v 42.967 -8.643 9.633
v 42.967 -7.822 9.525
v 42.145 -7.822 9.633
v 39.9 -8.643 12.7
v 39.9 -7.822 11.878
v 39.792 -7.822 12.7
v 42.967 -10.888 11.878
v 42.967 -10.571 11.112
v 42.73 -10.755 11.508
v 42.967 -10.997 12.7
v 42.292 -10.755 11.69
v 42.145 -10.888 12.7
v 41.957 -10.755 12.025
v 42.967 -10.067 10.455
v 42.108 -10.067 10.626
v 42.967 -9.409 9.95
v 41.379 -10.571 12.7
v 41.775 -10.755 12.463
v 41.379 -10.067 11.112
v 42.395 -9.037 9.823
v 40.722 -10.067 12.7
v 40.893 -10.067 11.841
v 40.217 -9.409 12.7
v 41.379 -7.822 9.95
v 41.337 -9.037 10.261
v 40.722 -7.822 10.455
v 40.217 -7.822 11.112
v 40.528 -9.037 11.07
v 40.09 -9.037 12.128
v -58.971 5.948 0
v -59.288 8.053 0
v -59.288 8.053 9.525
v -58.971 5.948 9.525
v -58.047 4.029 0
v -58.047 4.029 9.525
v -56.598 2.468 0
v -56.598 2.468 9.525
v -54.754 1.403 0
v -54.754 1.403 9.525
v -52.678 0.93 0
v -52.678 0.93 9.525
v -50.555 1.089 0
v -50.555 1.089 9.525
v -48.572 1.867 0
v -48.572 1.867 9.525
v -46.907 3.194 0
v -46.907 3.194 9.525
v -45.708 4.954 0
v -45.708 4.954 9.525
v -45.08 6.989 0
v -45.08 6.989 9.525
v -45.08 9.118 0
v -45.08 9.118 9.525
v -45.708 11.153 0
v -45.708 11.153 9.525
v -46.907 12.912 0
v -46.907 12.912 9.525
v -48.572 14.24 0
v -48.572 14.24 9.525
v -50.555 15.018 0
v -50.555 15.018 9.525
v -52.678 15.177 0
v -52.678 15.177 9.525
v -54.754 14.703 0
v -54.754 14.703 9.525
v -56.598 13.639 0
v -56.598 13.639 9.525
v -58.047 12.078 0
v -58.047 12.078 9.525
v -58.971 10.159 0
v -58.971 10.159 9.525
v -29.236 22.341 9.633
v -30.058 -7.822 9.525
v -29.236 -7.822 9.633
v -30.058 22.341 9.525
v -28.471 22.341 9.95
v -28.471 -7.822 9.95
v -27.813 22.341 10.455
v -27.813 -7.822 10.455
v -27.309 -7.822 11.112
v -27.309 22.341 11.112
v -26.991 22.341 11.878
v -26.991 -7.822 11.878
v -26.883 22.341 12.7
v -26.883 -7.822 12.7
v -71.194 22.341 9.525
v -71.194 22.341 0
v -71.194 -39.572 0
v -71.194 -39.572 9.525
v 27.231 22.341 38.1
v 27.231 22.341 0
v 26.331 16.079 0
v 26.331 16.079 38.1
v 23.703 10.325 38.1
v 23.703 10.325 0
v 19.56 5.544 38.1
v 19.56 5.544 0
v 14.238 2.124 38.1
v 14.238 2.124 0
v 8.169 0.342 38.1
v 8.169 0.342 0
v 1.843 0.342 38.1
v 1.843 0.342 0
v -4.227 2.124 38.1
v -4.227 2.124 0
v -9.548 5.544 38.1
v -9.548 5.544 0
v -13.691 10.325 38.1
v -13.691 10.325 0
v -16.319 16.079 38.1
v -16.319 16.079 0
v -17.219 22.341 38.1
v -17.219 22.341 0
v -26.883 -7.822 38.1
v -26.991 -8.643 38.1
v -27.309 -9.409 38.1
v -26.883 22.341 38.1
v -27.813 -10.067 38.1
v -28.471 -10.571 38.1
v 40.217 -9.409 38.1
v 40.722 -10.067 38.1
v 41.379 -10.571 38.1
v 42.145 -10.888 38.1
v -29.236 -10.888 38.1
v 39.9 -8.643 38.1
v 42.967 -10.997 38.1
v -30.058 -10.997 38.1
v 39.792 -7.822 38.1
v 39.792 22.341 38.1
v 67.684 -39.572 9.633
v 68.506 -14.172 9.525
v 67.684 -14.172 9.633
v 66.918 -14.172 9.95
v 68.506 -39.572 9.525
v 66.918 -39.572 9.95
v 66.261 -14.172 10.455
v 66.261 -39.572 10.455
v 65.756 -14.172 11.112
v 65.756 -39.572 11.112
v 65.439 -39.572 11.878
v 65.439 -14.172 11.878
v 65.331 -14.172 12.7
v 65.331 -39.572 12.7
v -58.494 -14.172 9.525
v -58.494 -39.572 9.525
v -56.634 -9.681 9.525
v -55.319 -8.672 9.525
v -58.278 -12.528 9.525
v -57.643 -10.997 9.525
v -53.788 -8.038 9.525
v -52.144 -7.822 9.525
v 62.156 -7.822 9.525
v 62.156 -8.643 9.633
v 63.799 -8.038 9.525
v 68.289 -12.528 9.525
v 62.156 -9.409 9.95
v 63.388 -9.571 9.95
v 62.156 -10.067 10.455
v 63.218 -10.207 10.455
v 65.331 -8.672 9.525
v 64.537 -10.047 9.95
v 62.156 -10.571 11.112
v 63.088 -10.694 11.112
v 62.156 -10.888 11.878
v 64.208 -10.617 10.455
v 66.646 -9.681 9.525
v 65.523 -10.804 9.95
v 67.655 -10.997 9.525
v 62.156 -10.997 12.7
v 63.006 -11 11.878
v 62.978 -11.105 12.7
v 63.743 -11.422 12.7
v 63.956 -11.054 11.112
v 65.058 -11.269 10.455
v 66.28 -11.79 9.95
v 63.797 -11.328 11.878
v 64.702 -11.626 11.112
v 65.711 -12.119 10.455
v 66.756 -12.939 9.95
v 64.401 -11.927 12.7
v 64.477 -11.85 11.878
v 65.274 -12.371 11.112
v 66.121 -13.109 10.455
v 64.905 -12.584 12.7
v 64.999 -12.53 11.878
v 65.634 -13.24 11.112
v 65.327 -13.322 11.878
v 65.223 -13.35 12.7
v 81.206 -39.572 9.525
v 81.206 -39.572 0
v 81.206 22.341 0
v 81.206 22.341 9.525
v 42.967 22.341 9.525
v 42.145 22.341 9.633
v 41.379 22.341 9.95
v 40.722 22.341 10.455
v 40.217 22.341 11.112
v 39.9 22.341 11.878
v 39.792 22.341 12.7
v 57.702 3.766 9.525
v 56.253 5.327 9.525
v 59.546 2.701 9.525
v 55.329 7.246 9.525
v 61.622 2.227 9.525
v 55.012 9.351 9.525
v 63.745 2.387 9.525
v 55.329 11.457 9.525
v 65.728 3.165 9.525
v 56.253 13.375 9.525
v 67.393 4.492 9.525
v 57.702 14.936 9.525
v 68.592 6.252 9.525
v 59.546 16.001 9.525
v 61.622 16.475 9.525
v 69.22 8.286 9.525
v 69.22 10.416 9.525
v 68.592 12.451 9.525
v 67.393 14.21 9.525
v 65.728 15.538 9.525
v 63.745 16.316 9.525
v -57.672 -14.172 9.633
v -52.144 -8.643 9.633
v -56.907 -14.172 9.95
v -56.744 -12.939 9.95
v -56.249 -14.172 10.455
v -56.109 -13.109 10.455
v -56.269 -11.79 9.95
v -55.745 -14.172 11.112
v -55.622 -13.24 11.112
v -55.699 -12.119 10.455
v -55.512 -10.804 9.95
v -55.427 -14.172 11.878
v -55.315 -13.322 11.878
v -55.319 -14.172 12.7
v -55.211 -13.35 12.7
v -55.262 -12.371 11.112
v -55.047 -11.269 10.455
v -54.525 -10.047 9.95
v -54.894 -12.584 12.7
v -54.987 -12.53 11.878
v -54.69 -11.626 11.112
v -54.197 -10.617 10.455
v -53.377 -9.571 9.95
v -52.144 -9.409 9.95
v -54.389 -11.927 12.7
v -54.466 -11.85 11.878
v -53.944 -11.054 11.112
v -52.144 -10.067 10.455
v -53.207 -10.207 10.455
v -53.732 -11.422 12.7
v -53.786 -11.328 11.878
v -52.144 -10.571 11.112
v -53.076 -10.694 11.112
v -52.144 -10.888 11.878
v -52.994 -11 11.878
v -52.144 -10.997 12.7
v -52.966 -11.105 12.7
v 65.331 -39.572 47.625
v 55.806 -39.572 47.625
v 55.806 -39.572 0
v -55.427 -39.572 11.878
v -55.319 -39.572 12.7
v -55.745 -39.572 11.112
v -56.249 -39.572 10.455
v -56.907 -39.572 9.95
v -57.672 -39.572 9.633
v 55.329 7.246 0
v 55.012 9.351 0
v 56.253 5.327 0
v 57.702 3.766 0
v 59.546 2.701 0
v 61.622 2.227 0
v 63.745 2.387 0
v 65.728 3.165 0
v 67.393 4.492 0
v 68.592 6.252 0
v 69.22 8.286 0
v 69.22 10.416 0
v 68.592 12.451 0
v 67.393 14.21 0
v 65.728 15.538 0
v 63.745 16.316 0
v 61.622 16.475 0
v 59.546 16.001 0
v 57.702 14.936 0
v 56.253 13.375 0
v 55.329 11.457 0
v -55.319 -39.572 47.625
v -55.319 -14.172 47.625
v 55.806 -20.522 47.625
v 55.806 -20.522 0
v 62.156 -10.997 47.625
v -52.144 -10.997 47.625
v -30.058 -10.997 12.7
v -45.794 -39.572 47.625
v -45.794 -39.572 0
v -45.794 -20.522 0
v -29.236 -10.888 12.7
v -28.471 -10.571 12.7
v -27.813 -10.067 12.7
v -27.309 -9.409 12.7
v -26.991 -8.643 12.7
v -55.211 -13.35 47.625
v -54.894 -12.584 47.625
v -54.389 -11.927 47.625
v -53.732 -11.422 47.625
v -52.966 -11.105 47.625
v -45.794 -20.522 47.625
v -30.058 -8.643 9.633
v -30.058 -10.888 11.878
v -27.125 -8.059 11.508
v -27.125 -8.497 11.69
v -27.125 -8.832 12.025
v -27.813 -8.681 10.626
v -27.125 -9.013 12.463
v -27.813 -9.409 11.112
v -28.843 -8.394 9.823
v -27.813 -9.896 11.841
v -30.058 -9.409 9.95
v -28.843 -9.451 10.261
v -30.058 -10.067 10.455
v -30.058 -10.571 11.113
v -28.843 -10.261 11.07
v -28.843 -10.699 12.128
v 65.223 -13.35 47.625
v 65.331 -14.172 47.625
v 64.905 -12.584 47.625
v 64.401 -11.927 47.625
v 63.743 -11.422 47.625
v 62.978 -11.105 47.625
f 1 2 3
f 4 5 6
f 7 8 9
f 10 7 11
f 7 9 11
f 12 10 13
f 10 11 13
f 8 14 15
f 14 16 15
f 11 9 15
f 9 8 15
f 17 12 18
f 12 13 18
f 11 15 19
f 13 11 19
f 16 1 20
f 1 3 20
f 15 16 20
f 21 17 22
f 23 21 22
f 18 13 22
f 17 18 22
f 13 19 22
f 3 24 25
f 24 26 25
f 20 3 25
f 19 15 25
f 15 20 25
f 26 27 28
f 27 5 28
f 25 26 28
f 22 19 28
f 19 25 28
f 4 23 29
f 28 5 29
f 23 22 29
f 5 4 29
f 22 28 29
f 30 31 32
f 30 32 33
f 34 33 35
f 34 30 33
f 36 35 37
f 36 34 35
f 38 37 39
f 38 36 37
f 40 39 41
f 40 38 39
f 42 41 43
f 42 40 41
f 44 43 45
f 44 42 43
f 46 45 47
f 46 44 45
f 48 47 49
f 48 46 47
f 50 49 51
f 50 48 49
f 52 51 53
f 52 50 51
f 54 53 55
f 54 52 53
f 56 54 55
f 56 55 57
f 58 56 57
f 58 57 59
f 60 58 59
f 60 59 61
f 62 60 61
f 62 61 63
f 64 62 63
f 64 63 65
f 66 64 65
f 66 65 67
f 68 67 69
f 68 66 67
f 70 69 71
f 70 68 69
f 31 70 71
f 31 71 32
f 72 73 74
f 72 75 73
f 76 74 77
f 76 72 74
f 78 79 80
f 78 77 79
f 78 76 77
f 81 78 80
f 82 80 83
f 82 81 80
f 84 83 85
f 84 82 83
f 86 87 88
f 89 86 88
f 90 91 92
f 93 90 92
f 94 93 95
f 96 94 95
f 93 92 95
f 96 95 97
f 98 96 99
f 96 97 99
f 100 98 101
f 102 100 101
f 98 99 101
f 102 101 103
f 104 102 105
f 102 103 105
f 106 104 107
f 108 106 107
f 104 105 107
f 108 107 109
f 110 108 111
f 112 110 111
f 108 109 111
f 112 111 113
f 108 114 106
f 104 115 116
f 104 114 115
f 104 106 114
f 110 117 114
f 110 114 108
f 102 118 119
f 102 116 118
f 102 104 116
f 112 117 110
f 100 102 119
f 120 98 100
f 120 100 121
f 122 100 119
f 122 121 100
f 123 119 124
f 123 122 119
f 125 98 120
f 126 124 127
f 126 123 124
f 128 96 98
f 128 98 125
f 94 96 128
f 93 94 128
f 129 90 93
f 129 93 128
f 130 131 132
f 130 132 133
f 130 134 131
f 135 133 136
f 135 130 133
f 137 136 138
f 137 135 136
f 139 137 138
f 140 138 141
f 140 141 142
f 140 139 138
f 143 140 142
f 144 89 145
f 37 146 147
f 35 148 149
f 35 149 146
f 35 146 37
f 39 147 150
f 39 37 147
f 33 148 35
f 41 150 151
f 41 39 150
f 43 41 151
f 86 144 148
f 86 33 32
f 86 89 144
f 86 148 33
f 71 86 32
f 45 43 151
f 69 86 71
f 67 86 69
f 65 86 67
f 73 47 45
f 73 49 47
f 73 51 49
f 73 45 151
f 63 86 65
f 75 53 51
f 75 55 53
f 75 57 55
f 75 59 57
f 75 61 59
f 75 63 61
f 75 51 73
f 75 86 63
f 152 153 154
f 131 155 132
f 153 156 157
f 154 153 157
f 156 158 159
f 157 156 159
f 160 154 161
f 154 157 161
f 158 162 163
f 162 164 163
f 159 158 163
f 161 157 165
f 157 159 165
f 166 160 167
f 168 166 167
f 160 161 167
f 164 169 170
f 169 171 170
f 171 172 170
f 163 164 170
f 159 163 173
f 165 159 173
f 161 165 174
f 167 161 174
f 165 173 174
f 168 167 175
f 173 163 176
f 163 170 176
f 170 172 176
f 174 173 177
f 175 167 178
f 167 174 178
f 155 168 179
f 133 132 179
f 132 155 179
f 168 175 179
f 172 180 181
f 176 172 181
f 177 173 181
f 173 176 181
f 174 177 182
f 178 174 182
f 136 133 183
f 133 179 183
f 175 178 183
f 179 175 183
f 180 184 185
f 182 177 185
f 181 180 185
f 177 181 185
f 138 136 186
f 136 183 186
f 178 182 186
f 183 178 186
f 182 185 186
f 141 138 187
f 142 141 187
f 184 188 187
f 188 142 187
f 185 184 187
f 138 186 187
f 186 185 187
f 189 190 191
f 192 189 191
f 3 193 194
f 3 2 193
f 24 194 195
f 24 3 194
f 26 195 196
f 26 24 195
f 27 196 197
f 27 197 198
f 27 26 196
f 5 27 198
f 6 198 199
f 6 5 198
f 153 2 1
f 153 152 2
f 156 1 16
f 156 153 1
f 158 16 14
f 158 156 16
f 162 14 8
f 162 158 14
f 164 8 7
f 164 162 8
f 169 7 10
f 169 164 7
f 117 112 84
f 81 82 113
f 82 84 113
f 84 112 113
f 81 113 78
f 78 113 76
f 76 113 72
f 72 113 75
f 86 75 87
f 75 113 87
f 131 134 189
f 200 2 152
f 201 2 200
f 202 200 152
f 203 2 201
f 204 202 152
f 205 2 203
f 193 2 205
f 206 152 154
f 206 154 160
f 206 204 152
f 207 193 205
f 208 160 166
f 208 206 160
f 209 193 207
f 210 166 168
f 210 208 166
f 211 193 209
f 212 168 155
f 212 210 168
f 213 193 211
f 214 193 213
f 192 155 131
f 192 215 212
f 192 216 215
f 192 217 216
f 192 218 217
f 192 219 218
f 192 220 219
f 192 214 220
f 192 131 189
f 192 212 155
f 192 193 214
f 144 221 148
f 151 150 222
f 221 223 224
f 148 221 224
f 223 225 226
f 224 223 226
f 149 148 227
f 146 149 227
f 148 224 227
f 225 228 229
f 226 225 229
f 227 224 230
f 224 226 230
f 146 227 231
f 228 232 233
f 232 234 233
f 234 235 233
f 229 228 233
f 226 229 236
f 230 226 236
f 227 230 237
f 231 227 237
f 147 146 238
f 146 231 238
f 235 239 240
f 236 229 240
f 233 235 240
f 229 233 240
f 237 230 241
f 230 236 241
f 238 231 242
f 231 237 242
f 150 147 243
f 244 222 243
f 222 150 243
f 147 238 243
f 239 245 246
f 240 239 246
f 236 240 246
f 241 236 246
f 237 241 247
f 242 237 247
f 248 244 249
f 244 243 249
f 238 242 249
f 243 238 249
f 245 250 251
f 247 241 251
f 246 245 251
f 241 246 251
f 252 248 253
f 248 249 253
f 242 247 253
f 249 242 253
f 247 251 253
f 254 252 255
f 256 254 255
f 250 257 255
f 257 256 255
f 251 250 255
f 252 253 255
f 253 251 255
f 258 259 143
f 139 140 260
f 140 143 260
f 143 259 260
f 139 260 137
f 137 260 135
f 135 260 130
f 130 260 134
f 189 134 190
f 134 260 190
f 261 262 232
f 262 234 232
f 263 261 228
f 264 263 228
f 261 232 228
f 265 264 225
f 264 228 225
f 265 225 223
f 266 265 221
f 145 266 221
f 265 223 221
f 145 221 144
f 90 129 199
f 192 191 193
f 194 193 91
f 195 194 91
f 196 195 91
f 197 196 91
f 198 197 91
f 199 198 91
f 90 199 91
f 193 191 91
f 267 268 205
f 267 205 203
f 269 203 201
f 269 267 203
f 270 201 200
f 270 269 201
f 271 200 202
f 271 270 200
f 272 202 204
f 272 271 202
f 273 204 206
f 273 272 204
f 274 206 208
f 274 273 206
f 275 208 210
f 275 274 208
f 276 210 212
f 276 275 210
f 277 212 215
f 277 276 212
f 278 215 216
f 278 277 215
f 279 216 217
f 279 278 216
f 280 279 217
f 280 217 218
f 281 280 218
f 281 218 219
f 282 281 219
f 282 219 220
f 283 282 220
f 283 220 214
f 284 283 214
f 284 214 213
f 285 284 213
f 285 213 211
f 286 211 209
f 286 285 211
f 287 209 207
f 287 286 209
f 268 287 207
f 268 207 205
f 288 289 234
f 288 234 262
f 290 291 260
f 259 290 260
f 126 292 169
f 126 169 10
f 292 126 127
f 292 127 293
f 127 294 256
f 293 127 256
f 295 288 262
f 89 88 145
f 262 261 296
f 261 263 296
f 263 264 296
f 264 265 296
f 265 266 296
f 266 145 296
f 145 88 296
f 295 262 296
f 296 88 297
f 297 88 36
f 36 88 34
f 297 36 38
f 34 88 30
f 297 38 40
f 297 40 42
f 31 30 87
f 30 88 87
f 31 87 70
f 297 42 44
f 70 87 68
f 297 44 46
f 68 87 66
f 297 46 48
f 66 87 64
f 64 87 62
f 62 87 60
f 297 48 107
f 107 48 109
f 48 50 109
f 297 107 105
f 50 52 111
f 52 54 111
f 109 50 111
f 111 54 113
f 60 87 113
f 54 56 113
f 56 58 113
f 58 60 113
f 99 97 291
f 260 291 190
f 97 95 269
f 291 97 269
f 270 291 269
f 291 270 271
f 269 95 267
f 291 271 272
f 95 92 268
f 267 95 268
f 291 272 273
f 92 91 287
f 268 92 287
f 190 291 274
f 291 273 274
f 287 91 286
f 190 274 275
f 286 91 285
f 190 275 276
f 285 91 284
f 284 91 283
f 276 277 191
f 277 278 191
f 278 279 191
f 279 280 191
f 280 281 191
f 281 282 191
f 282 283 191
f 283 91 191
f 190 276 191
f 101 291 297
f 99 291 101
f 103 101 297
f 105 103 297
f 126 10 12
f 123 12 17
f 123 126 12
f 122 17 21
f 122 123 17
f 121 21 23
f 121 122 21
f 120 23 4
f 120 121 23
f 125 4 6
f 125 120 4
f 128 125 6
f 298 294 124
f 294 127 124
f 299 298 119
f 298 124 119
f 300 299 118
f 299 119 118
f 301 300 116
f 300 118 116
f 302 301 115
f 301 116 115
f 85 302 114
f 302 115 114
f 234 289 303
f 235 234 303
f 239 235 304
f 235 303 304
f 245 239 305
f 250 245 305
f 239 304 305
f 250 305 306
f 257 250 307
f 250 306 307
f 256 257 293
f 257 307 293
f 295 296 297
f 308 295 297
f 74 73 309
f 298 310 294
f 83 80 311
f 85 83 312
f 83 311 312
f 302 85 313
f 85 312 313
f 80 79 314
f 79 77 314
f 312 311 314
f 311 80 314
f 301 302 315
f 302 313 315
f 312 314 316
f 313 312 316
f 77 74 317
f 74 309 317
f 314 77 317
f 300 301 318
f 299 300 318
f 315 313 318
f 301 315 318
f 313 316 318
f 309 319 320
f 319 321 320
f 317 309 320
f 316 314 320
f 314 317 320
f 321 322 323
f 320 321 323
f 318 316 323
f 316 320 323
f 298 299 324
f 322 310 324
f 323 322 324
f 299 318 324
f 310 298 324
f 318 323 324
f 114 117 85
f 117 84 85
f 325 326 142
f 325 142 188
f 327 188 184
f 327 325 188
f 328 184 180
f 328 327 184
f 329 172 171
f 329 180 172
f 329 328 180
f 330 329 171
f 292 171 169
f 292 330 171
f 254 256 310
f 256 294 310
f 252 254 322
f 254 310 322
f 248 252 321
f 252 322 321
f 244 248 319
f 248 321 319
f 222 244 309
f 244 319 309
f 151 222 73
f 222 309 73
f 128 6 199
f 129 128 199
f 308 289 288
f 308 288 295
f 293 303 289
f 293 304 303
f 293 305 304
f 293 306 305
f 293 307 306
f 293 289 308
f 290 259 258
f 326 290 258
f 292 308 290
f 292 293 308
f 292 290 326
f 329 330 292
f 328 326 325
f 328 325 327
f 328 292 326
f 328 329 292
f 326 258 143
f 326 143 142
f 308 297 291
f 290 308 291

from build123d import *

# Parameters (mm, degrees)
SKETCH1_R             = 7.14375
BOSS_EXTRUDE1_DEPTH   = 9.525
BOSS_EXTRUDE1_2_DEPTH = 9.525
BOSS_EXTRUDE2_DEPTH   = 47.625
BOSS_EXTRUDE3_DEPTH   = 38.1
FILLET1_R             = 3.175


with BuildPart() as part:
    # Sketch1 → Boss-Extrude1 (new body)
    with BuildSketch(Plane.XY):
        Polygon((-26.883211679, -10.996624088), (-26.883211679, 22.340875912), (-71.194160584, 22.340875912), (-71.194160584, -39.571624088), (-55.319160584, -39.571624088), (-55.319160584, -10.996624088), align=None)
        with Locations((-52.144160584, 8.053375912)):
            Circle(SKETCH1_R, mode=Mode.SUBTRACT)
    extrude(amount=BOSS_EXTRUDE1_DEPTH)



with BuildPart() as body_2:
    # Sketch1 → Boss-Extrude1 2 (new body)
    with BuildSketch(Plane.XY):
        Polygon((39.791788321, 22.340875912), (39.791788321, -10.996624088), (65.330839416, -10.996624088), (65.330839416, -39.571624088), (81.205839416, -39.571624088), (81.205839416, 22.340875912), align=None)
        with Locations((62.155839416, 9.351186131)):
            Circle(SKETCH1_R, mode=Mode.SUBTRACT)
    extrude(amount=BOSS_EXTRUDE1_2_DEPTH)


with BuildPart() as part_1:
    add(part.part)

    add(body_2.part)  # Boss-Extrude2 merges body 2
    # Sketch1<4> → Boss-Extrude2 (add)
    with BuildSketch(Plane.XY):
        Polygon((39.791788321, -10.996624088), (-26.883211679, -10.996624088), (-55.319160584, -10.996624088), (-55.319160584, -39.571624088), (-45.794160584, -39.571624088), (-45.794160584, -37.984124088), (-45.794160584, -20.521624088), (55.805839416, -20.521624088), (55.805839416, -37.984124088), (55.805839416, -39.571624088), (65.330839416, -39.571624088), (65.330839416, -10.996624088), align=None)
    extrude(amount=BOSS_EXTRUDE2_DEPTH)

    # Sketch1<5> → Boss-Extrude3 (add)
    with BuildSketch(Plane.XY):
        with BuildLine():
            Line((-17.219160584, 22.340875912), (-26.883211679, 22.340875912))
            Line((-26.883211679, 22.340875912), (-26.883211679, -10.996624088))
            Line((-26.883211679, -10.996624088), (39.791788321, -10.996624088))
            Line((39.791788321, -10.996624088), (39.791788321, 22.340875912))
            Line((39.791788321, 22.340875912), (27.230839416, 22.340875912))
            ThreePointArc((27.230839416, 22.340875912), (5.005839416, 0.115875912), (-17.219160584, 22.340875912))
        make_face()
    extrude(amount=BOSS_EXTRUDE3_DEPTH)

    # Fillet1
    fillet1_edges = [part_1.edges().sort_by_distance(p)[0] for p in [
        (-55.319160584, -10.996624088, 28.575),
        (-26.883211679, 5.672125912, 9.525),
        (-26.883211679, -10.996624088, 23.8125),
        (-55.319160584, -25.284124088, 9.525),
        (-41.101186131, -10.996624088, 9.525),
        (65.330839416, -25.284124088, 9.525),
        (52.561313869, -10.996624088, 9.525),
        (39.791788321, 5.672125912, 9.525),
        (39.791788321, -10.996624088, 23.8125),
        (65.330839416, -10.996624088, 28.575),
    ]]
    fillet(fillet1_edges, radius=FILLET1_R)


solid = part_1.part
